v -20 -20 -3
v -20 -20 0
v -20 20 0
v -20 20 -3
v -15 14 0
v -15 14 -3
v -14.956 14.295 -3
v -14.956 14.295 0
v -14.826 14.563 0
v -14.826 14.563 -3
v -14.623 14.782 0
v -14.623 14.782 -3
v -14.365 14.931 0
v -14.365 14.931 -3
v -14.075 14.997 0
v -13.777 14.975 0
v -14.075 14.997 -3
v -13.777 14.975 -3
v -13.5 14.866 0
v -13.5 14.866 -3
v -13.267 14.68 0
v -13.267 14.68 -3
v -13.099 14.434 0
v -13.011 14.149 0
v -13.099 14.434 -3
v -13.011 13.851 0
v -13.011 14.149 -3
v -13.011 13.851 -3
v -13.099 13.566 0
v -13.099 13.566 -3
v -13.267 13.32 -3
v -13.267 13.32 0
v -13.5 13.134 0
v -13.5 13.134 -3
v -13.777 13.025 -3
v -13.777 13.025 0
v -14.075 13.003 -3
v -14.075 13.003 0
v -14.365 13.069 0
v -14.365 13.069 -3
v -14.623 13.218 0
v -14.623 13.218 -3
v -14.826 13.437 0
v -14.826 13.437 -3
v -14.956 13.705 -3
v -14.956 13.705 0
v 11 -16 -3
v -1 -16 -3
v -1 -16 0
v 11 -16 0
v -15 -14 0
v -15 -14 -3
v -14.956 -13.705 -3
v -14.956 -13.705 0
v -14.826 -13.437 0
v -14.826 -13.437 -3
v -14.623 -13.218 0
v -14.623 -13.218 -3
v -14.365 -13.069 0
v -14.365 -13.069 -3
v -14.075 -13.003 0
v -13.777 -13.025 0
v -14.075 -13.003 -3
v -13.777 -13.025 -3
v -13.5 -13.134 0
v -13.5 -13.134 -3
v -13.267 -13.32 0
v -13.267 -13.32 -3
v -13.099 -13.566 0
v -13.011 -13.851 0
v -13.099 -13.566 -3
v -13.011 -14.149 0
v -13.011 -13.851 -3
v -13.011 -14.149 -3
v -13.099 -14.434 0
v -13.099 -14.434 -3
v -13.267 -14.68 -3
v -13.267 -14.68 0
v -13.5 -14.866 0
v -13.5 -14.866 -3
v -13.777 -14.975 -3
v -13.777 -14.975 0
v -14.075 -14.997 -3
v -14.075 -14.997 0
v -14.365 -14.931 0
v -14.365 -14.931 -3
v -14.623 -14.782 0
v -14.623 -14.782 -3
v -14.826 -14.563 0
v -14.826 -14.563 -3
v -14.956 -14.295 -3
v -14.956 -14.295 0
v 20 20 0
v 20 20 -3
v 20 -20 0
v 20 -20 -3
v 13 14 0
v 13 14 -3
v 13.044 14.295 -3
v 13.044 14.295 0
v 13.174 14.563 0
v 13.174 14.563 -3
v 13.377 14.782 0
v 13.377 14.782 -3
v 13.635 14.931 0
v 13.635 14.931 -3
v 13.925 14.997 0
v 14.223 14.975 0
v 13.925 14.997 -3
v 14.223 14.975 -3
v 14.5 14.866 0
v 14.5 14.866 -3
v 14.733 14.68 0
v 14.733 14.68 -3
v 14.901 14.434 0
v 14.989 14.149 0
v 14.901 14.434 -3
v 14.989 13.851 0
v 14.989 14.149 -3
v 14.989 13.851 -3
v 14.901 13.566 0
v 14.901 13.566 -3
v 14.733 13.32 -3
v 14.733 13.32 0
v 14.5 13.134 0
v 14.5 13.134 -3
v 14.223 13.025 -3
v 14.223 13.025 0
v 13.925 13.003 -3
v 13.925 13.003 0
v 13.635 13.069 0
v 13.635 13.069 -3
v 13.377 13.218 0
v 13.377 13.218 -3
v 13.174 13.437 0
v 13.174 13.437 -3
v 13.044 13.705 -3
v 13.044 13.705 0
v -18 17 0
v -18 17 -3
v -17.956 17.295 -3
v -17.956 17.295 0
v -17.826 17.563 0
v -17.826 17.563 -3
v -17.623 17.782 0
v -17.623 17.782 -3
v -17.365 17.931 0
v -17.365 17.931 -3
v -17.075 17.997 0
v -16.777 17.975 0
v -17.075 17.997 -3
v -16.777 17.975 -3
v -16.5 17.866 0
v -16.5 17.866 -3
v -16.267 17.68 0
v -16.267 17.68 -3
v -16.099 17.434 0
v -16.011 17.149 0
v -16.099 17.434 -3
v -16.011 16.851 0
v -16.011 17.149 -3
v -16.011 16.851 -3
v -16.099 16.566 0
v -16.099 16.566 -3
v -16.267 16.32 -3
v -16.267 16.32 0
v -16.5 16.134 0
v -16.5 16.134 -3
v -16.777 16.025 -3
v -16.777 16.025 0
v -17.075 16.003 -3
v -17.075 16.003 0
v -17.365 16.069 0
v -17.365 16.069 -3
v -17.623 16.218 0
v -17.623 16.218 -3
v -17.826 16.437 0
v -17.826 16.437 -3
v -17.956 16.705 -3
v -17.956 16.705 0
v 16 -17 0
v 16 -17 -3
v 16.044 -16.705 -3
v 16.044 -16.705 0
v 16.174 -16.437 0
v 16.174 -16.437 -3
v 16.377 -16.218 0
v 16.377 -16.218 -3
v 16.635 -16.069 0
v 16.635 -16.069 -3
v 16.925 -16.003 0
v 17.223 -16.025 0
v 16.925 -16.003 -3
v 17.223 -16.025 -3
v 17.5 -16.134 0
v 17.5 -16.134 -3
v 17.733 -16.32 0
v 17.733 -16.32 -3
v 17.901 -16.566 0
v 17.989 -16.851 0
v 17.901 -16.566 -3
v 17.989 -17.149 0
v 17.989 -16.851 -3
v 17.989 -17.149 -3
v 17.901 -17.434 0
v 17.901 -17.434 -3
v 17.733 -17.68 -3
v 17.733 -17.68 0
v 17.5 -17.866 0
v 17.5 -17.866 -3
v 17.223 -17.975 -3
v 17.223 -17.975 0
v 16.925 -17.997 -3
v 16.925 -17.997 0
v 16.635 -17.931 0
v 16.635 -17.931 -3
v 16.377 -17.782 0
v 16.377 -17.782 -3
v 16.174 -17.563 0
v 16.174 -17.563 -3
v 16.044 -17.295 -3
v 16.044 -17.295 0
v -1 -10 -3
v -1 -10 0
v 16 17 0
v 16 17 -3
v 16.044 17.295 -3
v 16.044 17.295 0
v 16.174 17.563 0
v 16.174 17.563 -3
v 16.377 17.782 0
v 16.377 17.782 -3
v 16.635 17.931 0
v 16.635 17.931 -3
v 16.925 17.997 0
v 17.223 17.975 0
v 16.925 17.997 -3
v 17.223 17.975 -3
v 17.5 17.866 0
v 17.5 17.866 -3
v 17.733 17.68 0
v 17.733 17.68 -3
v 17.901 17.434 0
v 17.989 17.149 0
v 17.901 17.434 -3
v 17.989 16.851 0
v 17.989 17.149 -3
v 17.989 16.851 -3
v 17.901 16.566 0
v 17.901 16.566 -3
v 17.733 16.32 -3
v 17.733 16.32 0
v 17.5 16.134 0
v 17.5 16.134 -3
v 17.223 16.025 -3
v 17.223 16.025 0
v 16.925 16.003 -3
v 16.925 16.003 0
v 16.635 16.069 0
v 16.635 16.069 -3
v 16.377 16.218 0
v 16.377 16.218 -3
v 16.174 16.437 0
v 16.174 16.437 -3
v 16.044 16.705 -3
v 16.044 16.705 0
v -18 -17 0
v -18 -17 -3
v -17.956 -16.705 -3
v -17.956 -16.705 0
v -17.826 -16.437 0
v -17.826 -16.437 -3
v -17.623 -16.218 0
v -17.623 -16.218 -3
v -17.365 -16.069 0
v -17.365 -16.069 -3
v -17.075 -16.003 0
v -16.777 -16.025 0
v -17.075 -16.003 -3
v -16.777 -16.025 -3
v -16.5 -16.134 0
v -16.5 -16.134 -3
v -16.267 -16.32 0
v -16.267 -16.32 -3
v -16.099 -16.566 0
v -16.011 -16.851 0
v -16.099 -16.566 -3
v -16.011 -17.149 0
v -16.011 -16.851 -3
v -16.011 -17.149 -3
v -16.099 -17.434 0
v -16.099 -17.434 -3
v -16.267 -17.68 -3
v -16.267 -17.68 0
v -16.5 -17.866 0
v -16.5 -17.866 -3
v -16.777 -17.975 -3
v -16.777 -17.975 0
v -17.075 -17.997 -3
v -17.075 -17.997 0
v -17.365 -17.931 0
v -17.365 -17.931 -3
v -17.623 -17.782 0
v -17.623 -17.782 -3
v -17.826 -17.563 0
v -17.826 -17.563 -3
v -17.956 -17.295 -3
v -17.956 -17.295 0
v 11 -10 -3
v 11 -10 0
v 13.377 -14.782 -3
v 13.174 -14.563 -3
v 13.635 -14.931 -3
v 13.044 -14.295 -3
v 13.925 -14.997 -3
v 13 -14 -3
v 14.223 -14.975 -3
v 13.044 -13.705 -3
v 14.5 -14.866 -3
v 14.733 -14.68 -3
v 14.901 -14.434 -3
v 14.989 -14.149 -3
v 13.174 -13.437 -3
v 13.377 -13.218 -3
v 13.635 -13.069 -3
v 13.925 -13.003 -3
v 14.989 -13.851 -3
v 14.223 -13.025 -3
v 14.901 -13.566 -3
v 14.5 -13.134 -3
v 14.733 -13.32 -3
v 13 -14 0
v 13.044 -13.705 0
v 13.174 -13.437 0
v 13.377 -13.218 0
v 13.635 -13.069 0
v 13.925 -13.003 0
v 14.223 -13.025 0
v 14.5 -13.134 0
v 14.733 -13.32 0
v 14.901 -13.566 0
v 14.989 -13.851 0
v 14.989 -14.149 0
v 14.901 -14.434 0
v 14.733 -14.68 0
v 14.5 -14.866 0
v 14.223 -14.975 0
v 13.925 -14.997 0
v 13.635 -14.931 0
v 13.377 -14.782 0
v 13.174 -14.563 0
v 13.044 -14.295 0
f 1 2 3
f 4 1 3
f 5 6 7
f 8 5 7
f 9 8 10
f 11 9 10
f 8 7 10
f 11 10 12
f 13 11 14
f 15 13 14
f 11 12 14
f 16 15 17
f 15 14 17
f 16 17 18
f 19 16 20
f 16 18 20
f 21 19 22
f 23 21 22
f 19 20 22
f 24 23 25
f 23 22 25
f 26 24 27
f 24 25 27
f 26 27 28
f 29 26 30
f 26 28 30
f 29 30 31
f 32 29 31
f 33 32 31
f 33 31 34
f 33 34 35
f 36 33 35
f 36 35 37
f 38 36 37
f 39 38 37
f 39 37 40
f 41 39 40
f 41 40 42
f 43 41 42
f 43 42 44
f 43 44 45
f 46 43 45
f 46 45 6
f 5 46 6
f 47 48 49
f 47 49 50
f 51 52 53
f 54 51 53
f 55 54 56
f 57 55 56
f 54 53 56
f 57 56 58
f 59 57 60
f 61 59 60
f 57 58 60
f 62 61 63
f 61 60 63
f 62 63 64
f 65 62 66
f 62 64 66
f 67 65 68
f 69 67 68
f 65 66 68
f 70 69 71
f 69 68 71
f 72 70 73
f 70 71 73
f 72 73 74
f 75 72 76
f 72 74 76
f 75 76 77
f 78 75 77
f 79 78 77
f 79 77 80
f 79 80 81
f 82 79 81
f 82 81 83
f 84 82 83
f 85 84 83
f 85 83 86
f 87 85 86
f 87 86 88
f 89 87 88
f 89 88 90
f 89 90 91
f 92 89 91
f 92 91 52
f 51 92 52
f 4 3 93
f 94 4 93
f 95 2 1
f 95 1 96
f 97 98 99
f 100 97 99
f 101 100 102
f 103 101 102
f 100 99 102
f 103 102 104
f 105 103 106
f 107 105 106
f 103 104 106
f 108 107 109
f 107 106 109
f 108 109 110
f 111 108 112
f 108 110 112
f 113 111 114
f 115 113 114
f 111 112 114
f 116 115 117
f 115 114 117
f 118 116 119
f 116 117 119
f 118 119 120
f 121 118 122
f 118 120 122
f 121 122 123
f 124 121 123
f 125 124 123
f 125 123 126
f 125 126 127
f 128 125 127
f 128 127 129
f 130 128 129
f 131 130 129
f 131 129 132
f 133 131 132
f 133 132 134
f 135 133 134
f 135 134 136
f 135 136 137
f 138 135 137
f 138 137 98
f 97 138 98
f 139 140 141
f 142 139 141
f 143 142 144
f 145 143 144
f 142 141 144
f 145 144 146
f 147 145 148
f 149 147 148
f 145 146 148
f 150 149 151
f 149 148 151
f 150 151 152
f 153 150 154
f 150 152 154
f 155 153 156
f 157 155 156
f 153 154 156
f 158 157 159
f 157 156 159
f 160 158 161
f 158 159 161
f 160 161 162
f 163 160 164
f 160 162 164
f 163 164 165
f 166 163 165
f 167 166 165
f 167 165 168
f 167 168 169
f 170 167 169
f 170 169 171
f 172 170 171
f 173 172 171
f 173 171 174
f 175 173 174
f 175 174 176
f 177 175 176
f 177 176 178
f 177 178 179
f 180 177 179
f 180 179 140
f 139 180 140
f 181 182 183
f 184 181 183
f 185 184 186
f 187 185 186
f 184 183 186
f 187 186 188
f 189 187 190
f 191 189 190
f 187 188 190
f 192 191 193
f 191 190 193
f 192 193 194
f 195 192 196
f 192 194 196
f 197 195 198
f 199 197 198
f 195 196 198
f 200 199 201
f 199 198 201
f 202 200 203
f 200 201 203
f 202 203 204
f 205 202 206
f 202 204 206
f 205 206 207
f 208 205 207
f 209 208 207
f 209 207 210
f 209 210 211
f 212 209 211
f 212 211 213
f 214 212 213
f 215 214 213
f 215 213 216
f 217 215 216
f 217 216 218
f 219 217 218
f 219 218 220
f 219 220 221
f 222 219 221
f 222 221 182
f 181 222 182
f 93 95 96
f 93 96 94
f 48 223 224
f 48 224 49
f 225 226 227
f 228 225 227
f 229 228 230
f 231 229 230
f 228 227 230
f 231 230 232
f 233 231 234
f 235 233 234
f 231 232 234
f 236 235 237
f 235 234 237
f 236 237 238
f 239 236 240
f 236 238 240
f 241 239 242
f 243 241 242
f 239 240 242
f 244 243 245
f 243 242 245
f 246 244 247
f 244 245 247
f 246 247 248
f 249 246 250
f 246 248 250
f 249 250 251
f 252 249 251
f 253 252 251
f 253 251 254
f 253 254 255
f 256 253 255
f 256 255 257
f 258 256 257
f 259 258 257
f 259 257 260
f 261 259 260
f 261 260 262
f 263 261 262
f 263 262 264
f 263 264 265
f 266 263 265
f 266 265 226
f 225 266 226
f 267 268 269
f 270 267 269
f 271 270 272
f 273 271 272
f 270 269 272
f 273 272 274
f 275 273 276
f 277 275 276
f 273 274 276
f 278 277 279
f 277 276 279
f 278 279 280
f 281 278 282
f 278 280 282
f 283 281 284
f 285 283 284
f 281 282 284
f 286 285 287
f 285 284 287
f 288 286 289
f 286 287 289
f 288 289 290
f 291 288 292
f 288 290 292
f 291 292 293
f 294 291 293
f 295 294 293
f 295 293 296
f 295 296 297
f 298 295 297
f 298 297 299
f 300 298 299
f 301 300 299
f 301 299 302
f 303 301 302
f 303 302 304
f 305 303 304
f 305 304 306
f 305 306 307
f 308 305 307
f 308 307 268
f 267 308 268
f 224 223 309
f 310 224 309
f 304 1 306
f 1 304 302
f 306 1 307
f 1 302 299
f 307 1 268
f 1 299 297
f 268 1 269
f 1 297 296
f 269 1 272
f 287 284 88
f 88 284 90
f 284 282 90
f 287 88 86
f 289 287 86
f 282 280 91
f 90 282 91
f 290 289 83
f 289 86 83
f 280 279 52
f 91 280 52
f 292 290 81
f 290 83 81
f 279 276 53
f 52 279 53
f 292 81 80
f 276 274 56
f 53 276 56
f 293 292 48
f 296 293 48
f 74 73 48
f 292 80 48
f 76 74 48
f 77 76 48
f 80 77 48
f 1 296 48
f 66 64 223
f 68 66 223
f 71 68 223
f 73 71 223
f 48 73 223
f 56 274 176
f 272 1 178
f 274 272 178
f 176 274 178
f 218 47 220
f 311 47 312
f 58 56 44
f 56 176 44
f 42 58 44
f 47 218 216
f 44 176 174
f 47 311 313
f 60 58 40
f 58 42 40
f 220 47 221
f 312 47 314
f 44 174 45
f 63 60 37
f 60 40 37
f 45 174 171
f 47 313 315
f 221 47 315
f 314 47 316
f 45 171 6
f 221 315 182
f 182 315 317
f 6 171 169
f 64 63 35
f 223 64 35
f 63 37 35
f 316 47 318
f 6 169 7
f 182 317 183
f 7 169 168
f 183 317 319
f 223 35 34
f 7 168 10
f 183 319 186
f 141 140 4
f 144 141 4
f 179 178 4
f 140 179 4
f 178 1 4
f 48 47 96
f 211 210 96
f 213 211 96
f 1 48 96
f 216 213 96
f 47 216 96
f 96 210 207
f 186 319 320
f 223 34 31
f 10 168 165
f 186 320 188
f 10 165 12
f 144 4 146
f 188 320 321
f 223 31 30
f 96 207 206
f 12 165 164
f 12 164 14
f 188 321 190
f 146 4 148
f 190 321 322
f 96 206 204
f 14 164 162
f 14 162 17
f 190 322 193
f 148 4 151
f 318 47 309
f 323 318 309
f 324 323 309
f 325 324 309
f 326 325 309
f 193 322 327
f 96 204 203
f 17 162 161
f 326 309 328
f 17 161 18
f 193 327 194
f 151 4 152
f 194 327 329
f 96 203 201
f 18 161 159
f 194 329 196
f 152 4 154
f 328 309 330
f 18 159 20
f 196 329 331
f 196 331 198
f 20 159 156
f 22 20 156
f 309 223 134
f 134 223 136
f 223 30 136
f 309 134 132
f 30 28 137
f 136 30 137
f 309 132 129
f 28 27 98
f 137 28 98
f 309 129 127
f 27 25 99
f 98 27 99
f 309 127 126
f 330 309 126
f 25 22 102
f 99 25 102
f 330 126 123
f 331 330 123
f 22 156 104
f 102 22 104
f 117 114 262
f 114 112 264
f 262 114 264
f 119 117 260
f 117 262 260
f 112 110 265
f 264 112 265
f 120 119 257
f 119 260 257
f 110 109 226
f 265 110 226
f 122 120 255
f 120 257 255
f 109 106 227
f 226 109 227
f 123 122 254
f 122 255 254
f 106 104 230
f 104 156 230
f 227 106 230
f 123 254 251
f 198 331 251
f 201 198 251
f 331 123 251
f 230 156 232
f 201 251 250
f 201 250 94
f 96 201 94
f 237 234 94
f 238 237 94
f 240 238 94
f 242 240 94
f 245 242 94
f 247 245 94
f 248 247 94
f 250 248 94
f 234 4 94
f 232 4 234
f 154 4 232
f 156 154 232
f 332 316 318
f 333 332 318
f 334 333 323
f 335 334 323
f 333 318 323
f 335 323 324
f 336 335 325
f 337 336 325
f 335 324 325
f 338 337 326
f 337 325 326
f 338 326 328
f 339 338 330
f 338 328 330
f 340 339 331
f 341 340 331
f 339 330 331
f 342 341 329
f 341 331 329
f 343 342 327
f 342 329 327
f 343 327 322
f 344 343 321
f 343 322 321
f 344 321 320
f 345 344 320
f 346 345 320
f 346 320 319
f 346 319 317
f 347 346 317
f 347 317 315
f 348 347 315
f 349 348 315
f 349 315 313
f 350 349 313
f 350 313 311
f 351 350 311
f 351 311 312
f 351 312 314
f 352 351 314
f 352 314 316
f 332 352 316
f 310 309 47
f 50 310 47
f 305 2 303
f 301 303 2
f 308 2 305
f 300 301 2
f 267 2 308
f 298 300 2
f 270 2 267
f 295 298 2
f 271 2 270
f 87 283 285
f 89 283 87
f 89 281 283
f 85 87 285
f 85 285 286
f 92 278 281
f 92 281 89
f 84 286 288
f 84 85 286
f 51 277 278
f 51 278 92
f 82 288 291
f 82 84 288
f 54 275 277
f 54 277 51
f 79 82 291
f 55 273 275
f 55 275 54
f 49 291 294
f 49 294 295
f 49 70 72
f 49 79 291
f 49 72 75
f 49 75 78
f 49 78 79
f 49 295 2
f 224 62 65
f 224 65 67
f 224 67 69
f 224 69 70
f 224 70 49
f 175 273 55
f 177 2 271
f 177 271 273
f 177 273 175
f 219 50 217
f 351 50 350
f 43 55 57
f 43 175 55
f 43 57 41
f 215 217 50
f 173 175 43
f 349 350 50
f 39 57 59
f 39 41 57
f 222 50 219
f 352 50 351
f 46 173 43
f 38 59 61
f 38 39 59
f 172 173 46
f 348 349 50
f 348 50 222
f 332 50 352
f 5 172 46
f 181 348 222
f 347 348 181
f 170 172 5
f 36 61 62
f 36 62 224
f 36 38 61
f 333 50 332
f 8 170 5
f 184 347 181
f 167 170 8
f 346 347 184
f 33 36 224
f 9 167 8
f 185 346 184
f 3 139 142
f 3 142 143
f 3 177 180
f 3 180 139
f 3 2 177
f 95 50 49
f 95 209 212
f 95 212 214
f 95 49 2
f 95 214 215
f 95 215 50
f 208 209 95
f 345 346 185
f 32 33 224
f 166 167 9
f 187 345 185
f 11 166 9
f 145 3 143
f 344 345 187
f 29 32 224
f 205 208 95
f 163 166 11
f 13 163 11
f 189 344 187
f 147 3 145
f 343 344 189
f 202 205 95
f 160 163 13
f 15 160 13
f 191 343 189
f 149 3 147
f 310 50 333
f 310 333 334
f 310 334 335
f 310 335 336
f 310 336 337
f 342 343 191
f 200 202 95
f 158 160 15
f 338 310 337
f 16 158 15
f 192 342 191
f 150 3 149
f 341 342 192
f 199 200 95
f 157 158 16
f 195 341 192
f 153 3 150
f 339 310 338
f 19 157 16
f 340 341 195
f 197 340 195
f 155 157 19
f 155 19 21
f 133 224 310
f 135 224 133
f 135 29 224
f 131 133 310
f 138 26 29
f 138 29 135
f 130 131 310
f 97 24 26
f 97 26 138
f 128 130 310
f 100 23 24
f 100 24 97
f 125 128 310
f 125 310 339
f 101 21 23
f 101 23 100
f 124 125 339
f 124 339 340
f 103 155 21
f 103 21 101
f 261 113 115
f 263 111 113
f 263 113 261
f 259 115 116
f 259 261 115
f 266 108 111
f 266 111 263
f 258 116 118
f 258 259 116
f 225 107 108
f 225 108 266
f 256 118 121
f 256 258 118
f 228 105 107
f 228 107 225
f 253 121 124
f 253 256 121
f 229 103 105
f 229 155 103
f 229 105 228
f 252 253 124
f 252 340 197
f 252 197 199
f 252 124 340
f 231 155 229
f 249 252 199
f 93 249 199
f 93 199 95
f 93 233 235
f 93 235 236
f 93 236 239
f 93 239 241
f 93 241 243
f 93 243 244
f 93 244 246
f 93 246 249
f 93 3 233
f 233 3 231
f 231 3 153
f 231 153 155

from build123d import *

# Parameters (mm, degrees)
F0_W     = 40
F0_H     = 40
F1_DEPTH = 3
F2_W     = 12
F2_H     = 6
F3_DEPTH = 3
F5_D     = 2
F5_DEPTH = 10


with BuildPart() as f1:
    # F0 (on Top) → F1 (new body)
    with BuildSketch(Plane.XY):
        Rectangle(F0_W, F0_H)
    extrude(amount=-F1_DEPTH)

    # F2 (on face) → F3 (cut)
    with BuildSketch(Plane(origin=(0, 0, -3), x_dir=(1, 0, 0), z_dir=(0, 0, -1))):
        with Locations((5, 13)):
            Rectangle(F2_W, F2_H)
    extrude(amount=-F3_DEPTH, mode=Mode.SUBTRACT)

    # F5
    with Locations(Plane.XY):
        with Locations((-17, 17), (17, 17), (14, 14), (-14, 14), (-17, -17), (-14, -14), (14, -14), (17, -17)):
            Hole(F5_D / 2, depth=F5_DEPTH)


solid = f1.part
